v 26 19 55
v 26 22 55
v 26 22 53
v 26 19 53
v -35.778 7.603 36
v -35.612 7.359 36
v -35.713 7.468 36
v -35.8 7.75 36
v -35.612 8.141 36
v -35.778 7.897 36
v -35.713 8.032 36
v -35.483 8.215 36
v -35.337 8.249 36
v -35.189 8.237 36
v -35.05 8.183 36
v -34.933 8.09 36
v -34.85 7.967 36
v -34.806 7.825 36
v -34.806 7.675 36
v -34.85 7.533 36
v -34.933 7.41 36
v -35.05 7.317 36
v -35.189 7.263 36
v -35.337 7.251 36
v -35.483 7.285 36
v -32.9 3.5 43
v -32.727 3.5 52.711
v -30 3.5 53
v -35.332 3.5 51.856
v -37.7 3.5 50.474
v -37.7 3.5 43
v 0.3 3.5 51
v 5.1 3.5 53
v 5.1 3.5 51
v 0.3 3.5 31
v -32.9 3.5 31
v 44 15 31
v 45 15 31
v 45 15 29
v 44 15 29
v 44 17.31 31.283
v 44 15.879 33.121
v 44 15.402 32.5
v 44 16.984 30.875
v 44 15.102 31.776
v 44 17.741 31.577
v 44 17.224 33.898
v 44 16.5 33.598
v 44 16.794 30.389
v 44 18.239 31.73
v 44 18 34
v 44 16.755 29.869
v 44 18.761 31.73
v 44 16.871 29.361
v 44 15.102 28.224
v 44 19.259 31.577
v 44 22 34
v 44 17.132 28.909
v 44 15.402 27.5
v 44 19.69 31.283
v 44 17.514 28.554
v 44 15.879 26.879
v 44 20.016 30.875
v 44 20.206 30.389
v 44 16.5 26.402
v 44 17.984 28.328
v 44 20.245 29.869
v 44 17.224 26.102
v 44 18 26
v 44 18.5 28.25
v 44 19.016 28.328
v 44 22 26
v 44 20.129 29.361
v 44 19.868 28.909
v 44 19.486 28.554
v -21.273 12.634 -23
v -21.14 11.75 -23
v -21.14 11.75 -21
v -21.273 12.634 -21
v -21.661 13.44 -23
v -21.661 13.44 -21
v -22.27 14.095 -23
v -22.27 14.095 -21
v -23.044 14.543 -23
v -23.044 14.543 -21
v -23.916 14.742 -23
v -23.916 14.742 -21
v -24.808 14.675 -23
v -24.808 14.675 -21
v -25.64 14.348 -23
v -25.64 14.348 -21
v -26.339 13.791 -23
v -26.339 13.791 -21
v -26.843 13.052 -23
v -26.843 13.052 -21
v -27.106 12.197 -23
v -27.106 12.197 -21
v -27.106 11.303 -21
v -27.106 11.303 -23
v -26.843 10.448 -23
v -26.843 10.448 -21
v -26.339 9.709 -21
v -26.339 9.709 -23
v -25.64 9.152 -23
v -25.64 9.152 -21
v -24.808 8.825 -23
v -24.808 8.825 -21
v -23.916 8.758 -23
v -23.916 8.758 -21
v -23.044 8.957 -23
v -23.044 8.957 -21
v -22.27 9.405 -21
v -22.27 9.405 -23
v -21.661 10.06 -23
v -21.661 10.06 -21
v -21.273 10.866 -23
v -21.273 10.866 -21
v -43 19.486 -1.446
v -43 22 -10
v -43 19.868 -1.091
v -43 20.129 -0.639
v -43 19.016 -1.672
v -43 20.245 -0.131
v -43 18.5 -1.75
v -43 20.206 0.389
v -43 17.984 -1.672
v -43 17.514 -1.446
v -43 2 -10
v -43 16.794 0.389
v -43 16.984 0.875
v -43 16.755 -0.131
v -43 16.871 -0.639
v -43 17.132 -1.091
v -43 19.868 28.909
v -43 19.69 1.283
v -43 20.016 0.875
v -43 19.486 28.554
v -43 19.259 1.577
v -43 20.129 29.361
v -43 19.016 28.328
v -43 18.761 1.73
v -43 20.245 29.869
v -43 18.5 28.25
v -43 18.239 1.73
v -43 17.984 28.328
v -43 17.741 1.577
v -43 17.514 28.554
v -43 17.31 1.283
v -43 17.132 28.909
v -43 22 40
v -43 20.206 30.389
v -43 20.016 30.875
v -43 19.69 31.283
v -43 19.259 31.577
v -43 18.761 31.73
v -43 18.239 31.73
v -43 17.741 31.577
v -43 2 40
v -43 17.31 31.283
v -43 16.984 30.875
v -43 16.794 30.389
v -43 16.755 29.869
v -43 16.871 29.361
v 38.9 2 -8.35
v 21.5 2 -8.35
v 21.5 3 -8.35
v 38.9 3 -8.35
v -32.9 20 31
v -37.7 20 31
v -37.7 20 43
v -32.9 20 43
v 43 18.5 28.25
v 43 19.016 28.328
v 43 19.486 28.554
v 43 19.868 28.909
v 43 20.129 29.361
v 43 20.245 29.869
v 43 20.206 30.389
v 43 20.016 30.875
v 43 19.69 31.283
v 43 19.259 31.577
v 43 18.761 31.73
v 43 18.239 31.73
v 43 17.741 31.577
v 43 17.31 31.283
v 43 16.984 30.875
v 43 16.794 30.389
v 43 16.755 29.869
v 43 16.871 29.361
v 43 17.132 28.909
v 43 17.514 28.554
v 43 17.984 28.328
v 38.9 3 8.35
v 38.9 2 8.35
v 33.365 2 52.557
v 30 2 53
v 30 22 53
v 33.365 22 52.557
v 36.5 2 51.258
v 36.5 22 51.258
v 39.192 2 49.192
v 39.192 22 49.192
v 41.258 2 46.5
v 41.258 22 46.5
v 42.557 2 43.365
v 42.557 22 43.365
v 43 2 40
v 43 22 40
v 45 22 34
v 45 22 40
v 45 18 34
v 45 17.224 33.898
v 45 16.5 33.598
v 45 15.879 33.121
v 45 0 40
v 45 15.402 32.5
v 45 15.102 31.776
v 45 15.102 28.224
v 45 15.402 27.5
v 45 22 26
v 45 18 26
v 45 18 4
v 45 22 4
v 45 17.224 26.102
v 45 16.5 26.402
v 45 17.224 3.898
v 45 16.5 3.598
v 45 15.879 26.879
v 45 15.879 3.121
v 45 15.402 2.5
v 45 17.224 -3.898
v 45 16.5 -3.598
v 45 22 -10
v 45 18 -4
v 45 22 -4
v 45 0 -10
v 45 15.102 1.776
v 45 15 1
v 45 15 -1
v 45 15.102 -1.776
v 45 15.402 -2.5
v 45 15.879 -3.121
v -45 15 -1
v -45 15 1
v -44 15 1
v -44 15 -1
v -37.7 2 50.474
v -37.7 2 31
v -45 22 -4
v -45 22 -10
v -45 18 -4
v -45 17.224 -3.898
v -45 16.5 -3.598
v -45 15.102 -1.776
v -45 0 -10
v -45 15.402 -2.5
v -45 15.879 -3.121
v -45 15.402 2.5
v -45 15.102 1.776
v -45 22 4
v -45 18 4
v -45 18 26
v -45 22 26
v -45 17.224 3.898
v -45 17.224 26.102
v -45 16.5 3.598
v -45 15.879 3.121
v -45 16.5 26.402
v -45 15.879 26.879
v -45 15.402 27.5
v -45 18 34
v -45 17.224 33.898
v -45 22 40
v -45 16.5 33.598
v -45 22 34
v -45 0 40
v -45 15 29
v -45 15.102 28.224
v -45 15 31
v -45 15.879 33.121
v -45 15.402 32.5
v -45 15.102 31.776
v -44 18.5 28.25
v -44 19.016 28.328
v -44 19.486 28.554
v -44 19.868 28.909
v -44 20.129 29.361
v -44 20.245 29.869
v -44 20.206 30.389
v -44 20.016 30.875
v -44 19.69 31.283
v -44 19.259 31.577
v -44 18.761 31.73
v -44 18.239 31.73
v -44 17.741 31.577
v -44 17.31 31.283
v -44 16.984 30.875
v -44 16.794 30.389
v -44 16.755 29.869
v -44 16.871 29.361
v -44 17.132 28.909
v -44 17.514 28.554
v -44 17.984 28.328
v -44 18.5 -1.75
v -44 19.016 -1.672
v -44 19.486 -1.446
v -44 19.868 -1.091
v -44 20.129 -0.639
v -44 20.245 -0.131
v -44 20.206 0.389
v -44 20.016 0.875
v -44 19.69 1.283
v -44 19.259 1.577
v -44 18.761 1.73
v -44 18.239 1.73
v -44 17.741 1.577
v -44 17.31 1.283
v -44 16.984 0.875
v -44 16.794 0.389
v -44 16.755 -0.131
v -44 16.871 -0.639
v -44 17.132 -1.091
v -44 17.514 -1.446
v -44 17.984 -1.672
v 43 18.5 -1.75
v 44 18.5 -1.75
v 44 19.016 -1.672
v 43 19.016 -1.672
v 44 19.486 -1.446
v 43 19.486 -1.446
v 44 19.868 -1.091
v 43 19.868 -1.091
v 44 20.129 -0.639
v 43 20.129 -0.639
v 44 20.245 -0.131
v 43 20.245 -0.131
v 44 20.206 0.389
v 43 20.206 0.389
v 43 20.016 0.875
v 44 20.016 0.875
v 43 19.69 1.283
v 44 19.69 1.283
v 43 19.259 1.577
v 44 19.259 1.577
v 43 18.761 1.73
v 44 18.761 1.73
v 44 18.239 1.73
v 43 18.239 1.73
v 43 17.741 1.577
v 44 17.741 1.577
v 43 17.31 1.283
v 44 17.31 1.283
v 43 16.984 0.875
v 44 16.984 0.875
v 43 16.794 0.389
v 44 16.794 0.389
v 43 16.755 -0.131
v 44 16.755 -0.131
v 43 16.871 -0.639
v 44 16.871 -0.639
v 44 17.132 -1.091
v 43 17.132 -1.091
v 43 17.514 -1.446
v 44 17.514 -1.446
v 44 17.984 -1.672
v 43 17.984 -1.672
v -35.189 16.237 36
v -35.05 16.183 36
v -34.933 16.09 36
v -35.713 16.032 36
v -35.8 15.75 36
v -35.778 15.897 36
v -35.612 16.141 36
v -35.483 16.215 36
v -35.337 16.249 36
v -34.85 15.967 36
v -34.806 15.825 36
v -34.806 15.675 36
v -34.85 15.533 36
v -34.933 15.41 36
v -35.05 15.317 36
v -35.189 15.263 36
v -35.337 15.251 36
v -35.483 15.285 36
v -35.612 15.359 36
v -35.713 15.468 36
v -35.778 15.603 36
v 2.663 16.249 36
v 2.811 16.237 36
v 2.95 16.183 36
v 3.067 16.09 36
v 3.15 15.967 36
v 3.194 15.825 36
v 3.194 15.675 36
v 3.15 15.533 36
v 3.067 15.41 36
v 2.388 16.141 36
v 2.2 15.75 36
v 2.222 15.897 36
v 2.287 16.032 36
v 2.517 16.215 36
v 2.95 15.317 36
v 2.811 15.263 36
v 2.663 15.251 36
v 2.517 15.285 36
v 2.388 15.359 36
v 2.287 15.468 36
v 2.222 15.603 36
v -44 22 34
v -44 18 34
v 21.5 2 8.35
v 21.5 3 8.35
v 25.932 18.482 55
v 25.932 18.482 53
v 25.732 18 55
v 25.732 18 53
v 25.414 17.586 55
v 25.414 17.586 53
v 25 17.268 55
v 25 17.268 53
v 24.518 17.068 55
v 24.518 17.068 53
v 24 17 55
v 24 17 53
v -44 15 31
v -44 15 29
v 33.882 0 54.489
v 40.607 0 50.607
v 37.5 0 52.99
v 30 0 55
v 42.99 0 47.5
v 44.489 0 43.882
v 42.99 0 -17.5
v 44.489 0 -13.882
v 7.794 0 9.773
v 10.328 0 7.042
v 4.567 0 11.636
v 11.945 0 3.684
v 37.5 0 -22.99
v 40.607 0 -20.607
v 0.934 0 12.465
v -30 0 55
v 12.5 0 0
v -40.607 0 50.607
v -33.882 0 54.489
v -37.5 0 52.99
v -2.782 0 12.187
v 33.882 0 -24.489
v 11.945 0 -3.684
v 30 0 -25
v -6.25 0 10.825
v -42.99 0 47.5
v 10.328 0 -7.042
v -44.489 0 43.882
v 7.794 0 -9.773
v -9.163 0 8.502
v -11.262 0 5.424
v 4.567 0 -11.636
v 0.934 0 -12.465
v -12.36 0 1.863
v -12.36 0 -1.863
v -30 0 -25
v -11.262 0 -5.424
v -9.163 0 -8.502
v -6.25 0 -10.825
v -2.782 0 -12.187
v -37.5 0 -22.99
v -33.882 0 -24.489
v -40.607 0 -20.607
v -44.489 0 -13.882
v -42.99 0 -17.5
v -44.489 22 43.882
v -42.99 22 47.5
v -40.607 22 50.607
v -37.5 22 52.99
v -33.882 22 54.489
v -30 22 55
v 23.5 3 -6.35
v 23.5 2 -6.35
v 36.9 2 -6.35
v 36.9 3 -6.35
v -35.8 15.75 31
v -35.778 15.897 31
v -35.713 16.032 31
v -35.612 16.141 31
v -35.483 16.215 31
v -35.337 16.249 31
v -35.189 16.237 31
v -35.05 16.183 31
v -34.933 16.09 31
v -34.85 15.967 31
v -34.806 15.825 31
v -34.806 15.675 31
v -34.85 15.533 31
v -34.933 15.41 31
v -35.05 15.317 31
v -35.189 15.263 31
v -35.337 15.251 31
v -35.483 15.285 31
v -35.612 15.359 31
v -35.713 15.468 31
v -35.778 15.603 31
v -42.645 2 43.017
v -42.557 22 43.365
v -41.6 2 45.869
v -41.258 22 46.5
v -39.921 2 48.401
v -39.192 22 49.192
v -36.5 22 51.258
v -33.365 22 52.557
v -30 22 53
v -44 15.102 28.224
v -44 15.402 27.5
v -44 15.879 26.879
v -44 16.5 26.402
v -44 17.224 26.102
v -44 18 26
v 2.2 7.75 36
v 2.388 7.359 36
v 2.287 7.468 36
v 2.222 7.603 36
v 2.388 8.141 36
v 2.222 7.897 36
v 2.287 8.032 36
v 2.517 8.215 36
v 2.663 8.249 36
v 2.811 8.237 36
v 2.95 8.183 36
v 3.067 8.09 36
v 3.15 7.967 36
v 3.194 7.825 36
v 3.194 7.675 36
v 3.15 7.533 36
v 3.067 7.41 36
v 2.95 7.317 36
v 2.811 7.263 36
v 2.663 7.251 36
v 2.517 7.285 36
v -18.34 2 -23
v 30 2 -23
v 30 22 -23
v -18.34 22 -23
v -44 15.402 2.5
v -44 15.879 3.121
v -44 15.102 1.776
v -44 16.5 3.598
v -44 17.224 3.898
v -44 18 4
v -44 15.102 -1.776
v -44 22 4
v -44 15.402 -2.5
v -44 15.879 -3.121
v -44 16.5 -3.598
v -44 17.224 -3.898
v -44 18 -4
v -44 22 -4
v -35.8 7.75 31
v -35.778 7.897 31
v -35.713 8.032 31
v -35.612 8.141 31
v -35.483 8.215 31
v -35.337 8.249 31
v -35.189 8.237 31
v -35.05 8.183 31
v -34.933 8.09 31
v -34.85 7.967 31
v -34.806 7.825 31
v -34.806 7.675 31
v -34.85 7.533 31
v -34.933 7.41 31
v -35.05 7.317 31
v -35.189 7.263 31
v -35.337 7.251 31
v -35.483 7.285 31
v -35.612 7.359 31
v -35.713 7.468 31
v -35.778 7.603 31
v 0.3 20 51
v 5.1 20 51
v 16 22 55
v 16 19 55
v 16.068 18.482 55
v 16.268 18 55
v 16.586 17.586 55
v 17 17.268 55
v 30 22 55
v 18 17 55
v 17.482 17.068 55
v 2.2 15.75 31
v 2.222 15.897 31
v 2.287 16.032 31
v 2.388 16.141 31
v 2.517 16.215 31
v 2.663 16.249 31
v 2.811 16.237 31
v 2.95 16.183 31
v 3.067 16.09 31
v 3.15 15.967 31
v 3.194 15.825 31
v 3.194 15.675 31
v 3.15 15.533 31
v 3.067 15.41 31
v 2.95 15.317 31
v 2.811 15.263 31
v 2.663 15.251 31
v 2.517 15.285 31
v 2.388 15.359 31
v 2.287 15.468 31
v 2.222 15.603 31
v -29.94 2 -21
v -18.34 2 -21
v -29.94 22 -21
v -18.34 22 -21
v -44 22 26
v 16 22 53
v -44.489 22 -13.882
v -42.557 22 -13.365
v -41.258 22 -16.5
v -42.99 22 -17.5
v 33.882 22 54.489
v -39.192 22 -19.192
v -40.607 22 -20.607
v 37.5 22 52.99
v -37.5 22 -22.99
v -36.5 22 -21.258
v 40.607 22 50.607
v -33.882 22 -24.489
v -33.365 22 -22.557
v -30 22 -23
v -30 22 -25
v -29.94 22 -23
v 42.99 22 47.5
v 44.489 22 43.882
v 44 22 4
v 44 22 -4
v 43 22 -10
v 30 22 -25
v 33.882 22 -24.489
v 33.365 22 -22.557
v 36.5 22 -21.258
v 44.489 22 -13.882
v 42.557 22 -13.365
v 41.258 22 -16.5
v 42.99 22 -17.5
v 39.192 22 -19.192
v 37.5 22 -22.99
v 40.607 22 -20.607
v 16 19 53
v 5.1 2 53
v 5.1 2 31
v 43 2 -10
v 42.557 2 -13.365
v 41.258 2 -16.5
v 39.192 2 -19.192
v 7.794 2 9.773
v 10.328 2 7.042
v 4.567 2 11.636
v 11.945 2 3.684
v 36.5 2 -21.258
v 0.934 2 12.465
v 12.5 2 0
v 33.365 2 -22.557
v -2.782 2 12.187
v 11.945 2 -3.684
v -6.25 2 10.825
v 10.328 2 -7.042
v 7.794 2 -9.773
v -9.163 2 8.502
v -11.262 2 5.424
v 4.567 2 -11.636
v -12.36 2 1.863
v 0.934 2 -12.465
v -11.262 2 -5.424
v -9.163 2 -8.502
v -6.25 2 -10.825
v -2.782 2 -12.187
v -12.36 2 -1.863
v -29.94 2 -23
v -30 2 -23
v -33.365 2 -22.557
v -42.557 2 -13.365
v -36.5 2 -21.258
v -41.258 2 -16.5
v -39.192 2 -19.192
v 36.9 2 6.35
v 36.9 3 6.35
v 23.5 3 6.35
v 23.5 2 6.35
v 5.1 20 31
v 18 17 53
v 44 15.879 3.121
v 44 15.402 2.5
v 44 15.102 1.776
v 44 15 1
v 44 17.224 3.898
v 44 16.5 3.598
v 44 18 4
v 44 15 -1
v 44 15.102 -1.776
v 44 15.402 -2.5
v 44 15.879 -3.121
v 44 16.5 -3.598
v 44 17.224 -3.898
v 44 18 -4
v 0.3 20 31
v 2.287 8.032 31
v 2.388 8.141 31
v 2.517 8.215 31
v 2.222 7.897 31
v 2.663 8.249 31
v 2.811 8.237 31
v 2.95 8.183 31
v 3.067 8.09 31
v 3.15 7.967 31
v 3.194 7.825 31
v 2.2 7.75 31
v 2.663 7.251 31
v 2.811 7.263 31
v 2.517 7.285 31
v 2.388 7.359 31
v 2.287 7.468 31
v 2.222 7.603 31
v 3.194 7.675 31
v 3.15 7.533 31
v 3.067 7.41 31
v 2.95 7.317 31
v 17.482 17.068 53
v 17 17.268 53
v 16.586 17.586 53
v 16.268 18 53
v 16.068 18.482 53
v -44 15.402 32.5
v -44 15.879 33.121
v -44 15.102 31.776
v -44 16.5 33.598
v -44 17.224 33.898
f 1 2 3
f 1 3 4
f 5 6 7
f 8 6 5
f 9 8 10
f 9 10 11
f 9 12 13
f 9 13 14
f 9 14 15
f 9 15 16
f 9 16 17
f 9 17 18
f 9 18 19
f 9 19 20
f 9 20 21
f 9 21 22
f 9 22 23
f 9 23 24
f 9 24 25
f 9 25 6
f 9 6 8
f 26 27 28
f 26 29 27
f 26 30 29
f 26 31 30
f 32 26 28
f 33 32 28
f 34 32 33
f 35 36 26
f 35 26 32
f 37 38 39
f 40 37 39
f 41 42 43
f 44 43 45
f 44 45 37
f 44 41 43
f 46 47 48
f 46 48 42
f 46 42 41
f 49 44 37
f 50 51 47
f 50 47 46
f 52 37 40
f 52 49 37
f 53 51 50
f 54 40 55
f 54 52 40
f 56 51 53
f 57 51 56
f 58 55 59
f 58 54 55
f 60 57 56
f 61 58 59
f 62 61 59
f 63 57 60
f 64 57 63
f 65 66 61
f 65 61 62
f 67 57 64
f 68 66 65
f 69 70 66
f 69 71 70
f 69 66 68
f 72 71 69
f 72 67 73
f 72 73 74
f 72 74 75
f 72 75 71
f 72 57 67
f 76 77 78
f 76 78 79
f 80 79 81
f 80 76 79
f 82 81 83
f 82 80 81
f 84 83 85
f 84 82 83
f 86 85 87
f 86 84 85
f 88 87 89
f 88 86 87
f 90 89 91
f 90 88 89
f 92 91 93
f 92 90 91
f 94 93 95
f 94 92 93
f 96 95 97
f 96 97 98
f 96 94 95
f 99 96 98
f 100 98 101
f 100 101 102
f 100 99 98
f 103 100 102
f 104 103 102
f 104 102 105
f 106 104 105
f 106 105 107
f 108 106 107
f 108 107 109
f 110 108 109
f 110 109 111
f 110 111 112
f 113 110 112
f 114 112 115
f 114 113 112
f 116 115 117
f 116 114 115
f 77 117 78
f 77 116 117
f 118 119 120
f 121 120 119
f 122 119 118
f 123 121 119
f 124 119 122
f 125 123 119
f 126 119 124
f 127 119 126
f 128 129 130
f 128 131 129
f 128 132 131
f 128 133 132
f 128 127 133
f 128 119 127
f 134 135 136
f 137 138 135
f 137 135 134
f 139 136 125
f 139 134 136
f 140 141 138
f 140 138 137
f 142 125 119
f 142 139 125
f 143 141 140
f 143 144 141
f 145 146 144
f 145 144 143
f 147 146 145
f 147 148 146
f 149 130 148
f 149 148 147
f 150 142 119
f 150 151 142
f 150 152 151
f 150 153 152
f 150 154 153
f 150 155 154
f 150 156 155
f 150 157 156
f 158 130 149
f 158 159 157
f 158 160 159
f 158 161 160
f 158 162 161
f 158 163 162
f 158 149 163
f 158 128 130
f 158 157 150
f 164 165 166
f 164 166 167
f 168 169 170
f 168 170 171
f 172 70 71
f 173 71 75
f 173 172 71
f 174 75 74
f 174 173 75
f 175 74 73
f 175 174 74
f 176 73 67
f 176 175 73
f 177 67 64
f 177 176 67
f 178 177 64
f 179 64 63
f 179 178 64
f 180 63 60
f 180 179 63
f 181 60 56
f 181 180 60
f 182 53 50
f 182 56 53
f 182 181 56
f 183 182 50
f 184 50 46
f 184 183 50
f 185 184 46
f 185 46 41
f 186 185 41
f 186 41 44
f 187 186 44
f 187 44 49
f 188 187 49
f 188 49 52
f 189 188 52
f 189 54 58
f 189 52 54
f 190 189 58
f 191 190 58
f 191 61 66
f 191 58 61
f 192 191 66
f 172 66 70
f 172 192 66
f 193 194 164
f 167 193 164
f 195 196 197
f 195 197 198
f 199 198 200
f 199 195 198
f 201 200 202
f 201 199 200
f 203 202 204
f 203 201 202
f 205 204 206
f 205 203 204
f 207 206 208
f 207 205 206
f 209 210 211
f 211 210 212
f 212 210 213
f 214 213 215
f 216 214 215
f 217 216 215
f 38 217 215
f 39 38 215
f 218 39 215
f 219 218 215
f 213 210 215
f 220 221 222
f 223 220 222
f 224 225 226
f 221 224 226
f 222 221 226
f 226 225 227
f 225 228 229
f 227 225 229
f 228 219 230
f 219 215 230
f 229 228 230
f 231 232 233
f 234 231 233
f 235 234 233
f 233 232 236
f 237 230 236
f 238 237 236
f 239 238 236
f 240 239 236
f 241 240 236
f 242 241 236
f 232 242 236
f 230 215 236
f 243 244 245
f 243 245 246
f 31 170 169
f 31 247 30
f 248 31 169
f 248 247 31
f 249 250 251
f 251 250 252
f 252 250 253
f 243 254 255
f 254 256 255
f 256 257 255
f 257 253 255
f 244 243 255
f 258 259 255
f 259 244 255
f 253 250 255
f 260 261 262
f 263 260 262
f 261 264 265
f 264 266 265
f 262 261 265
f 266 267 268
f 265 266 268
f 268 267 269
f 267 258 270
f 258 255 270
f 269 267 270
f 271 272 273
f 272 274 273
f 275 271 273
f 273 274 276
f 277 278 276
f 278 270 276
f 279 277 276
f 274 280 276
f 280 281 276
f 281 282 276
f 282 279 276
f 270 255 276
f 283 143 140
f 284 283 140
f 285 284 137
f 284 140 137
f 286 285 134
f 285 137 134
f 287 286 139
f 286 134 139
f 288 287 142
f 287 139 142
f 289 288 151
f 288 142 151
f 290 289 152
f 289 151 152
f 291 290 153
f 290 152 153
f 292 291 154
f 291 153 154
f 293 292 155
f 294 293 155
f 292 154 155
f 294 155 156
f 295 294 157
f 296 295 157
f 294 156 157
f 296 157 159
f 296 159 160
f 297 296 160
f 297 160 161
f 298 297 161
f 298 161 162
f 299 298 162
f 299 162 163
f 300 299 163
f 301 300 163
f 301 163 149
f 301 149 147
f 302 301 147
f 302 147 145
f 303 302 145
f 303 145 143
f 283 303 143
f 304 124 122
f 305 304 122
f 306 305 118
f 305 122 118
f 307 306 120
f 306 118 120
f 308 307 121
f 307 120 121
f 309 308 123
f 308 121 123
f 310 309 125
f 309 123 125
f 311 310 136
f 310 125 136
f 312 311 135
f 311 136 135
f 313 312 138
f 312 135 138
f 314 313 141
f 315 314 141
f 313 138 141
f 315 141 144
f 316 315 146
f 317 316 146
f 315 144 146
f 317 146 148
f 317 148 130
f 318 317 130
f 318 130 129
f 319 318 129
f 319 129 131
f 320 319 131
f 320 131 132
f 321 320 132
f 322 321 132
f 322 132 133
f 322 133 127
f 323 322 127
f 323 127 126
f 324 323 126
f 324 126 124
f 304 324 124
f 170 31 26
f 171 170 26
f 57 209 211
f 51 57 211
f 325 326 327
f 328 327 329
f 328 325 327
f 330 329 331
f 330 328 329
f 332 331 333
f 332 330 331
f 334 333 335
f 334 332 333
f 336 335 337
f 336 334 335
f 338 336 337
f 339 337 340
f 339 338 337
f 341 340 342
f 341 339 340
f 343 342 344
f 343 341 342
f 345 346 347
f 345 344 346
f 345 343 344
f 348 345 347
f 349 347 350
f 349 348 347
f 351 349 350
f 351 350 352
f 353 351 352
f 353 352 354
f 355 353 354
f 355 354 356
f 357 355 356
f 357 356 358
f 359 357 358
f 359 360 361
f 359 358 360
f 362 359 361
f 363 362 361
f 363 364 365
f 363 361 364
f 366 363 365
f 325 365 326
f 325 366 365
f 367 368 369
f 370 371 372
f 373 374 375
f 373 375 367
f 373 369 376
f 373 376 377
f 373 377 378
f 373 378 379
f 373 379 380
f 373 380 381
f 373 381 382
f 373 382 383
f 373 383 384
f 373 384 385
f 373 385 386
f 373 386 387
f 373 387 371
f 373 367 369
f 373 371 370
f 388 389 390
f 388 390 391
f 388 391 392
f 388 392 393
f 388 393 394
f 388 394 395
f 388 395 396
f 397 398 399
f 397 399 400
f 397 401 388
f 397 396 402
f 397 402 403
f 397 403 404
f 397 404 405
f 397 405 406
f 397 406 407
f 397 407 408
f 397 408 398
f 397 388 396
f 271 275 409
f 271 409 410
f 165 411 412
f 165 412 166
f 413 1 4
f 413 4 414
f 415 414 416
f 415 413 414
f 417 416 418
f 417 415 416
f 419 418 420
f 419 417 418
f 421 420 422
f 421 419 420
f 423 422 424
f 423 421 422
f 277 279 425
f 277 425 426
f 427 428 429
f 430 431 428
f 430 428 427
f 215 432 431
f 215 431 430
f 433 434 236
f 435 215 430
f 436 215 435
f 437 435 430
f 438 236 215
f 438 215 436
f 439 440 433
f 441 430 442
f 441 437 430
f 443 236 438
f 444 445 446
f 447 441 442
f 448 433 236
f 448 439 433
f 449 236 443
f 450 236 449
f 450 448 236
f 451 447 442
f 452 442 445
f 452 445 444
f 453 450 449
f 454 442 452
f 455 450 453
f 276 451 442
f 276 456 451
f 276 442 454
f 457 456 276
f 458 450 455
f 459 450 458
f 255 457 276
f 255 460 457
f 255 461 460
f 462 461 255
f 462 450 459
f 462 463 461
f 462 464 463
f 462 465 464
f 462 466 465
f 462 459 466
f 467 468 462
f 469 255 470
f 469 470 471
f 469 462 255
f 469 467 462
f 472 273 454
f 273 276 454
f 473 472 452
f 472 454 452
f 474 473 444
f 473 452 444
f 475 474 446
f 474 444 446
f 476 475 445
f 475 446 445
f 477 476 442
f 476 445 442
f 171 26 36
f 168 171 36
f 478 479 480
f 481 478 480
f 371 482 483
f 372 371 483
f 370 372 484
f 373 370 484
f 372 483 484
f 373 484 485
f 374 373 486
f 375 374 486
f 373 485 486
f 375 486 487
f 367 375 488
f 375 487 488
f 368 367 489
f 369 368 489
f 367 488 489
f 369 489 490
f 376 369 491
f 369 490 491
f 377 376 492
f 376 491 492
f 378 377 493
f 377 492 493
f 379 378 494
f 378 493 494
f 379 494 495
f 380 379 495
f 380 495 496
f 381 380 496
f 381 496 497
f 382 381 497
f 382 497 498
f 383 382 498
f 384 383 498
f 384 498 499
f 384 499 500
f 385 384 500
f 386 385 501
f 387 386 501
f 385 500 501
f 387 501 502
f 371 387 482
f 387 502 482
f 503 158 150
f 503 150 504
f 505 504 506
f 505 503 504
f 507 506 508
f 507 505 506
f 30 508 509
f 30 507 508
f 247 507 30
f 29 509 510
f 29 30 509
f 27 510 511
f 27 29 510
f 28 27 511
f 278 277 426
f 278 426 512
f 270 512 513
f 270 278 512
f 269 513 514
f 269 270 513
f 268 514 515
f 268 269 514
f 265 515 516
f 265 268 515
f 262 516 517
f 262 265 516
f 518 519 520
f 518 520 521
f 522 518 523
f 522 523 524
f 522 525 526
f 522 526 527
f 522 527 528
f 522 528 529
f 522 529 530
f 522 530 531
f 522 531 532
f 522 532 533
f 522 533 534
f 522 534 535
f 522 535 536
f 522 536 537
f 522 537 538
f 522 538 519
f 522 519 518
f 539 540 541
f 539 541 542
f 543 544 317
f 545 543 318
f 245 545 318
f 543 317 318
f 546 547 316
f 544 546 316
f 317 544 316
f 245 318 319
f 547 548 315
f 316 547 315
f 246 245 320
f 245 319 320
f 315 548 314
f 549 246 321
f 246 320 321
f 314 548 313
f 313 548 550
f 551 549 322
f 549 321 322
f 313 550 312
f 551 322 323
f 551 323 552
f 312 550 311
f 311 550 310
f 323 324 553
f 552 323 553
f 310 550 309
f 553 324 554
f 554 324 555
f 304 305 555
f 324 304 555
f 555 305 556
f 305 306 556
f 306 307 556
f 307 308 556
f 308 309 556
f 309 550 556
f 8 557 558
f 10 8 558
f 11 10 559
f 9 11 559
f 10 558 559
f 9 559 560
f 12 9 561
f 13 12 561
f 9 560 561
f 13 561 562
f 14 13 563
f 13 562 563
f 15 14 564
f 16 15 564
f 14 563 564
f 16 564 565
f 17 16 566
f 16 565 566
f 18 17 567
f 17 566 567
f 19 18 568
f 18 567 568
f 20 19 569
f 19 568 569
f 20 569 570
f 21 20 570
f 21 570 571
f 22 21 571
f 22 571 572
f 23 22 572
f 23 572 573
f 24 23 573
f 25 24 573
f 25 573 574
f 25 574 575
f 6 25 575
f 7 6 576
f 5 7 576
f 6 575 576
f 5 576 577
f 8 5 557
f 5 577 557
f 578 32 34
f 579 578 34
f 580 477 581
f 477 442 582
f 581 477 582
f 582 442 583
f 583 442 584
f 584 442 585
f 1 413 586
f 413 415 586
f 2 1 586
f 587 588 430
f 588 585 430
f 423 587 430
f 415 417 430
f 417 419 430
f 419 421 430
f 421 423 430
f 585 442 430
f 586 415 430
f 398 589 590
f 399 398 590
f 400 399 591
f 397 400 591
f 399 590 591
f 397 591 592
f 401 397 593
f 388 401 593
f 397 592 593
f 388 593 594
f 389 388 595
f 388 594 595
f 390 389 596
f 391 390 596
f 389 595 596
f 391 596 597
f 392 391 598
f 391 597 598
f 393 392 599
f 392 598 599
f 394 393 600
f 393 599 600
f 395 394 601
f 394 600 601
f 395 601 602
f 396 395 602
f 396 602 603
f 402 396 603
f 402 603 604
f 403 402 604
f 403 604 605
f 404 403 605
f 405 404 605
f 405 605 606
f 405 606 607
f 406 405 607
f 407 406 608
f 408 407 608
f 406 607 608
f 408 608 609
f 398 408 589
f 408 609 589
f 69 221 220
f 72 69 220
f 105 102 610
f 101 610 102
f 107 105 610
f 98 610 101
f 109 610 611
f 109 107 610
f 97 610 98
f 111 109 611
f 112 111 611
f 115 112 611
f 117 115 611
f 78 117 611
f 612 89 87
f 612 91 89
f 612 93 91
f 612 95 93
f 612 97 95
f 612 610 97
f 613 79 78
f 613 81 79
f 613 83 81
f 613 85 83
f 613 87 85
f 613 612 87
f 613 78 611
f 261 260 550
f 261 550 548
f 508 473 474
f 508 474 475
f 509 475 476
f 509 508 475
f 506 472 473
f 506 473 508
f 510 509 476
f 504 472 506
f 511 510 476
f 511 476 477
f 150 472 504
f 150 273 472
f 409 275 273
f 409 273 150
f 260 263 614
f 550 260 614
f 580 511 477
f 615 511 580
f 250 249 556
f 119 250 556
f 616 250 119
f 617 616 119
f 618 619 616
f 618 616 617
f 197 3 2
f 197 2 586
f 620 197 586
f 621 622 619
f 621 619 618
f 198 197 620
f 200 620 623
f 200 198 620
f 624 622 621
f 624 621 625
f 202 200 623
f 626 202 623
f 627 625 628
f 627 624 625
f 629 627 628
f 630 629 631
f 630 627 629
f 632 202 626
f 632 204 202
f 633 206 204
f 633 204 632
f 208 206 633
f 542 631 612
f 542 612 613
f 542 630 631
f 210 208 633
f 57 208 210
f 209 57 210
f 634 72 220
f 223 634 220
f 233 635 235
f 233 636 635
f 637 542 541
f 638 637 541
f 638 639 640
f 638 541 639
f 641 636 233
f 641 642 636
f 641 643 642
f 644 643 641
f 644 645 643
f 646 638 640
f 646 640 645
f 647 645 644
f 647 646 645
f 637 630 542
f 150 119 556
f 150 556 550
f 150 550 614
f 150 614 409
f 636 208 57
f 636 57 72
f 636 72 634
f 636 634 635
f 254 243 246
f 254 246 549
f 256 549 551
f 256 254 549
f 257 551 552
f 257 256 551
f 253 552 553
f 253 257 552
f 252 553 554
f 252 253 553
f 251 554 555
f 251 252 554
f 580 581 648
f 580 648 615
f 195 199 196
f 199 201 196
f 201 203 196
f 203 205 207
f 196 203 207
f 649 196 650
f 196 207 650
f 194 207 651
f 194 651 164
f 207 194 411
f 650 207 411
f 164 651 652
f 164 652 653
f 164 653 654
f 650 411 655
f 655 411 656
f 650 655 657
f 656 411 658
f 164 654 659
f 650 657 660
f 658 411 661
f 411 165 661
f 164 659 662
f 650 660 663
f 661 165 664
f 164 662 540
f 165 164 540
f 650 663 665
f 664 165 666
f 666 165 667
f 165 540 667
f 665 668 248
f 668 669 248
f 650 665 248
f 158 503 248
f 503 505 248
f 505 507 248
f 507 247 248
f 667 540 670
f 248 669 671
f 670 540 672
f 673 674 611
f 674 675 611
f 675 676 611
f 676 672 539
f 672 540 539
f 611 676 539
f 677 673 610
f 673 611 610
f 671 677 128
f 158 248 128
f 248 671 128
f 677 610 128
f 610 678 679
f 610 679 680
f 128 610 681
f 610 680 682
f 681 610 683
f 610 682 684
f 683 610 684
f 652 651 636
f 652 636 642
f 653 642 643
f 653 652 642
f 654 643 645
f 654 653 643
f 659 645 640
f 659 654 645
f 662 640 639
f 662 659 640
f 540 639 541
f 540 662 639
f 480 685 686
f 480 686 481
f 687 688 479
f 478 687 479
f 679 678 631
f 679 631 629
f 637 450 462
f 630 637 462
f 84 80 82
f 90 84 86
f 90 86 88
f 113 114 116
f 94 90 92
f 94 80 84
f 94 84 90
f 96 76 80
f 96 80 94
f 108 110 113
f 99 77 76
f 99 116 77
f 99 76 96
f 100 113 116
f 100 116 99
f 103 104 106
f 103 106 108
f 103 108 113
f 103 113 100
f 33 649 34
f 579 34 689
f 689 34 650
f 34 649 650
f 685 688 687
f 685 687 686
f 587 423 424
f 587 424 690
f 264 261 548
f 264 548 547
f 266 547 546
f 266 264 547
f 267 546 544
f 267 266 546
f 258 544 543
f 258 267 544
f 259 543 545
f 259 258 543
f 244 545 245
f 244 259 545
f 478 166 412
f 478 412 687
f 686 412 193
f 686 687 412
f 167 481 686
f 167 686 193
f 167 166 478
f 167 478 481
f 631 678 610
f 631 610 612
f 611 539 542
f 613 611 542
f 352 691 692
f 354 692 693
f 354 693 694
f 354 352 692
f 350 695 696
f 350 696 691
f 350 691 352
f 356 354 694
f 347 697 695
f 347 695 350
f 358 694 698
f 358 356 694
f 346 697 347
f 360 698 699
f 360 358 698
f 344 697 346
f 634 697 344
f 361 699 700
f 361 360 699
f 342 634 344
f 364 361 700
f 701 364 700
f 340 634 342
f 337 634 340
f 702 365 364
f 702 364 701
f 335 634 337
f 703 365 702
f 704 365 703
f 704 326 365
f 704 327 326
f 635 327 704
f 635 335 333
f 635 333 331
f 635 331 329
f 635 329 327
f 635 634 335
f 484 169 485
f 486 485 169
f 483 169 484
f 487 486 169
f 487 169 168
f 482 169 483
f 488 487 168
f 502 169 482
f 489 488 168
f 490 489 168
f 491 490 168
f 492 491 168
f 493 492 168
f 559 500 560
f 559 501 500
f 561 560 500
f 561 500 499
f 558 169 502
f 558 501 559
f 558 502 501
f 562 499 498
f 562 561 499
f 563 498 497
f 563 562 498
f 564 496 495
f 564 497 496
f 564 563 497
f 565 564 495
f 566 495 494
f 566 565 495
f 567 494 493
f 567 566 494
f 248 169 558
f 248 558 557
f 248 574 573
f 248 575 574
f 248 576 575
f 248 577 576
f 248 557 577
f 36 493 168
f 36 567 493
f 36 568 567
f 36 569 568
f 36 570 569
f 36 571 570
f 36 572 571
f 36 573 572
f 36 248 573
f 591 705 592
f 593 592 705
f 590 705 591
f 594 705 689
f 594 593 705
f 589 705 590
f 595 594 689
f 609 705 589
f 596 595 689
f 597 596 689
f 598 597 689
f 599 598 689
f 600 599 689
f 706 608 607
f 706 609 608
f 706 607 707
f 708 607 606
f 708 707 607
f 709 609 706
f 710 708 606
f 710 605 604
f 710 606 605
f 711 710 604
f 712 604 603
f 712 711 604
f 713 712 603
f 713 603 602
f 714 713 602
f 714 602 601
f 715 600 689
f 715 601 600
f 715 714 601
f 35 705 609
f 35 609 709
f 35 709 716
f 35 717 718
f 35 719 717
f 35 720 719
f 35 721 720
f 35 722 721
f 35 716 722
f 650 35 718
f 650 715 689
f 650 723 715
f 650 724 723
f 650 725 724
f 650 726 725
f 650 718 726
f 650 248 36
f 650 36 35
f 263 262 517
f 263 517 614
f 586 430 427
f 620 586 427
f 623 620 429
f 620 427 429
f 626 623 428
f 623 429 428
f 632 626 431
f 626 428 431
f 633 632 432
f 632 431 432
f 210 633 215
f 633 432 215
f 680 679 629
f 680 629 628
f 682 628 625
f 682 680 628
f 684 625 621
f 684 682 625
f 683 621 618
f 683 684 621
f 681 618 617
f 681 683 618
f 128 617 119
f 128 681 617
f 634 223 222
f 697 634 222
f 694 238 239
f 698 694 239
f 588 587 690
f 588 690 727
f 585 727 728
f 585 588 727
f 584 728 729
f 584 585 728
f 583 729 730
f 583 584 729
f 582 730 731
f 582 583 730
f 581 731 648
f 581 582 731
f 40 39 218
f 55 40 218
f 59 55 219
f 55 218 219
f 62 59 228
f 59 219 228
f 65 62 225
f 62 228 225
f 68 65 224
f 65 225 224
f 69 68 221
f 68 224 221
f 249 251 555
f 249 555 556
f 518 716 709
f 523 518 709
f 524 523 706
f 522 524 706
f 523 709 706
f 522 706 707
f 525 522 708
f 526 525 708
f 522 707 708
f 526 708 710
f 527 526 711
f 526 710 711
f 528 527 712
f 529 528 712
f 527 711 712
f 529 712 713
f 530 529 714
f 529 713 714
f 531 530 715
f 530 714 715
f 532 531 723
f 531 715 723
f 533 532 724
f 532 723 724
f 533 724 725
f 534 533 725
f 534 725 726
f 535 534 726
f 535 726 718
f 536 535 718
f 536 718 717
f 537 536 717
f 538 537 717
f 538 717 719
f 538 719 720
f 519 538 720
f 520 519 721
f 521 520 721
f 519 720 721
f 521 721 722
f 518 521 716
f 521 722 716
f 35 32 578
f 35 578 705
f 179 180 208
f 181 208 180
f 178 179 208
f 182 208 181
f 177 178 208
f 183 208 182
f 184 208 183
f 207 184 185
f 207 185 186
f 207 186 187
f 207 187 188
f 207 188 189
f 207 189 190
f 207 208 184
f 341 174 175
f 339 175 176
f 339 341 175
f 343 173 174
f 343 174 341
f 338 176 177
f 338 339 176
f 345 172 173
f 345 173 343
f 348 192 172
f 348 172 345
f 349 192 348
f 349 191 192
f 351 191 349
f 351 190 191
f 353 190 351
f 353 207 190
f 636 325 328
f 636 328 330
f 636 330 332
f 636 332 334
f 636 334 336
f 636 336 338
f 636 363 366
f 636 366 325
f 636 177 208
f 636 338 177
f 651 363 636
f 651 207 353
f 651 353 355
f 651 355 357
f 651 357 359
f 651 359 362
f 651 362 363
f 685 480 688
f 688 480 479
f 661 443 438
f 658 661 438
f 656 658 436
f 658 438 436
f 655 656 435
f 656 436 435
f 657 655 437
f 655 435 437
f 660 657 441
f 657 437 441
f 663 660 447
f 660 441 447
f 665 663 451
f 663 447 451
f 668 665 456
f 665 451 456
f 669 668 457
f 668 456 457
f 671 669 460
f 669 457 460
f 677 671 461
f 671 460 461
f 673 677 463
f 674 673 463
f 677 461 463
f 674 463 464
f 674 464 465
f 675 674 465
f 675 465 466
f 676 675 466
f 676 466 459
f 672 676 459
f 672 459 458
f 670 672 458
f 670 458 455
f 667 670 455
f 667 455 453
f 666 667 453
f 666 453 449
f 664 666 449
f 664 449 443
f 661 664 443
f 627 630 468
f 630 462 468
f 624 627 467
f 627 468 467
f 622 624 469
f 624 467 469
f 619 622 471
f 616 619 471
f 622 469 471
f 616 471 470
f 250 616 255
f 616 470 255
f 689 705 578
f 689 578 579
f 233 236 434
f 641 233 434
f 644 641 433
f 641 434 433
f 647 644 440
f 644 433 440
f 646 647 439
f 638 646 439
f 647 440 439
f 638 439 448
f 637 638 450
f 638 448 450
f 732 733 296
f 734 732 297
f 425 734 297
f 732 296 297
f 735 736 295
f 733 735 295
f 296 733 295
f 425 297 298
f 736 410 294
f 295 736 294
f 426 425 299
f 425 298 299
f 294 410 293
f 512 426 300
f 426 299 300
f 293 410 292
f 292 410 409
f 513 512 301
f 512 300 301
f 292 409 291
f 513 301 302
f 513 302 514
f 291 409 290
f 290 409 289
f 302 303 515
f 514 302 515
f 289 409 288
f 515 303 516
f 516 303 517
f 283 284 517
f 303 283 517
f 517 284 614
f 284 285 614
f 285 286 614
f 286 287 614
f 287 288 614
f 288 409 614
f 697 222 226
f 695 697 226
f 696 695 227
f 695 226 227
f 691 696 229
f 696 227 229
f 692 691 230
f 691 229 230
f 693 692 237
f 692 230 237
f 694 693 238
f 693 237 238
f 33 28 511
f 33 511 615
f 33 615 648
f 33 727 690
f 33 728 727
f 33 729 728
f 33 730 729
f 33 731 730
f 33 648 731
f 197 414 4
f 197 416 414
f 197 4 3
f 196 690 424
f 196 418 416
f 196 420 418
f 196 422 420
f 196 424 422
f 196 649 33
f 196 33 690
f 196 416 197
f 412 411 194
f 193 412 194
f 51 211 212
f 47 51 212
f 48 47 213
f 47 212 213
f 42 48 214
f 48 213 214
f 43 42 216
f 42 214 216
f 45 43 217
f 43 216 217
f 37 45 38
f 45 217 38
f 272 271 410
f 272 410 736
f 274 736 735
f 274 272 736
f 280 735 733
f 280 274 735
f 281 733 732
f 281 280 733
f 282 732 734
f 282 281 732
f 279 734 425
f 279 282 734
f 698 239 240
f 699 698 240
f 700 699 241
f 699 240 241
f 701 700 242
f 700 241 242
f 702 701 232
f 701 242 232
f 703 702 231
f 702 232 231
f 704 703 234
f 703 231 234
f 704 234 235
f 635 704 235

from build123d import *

# Parameters (mm, degrees)
BOSS_EXTRUDE1_DEPTH = 2
BOSS_EXTRUDE2_DEPTH = 20
SKETCH3_R           = 12.5
CUT_EXTRUDE2_DEPTH  = 23
BOSS_EXTRUDE3_DEPTH = 1.5
SKETCH6_W           = 17.4
SKETCH6_H           = 16.7
SKETCH6_W_2         = 13.4
SKETCH6_H_2         = 12.7
BOSS_EXTRUDE4_DEPTH = 1
SKETCH7_W           = 11.6
SKETCH7_H           = 20
SKETCH7_R           = 3
BOSS_EXTRUDE5_DEPTH = 2
SKETCH8_W           = 4.8
SKETCH8_H           = 12
SKETCH8_H_2         = 20
BOSS_EXTRUDE6_DEPTH = 16.5
SKETCH9_R           = 0.5
CUT_EXTRUDE3_DEPTH  = 5
CUT_EXTRUDE4_DEPTH  = 2
SKETCH11_R          = 1.75
CUT_EXTRUDE5_DEPTH  = 2
CUT_EXTRUDE6_DEPTH  = 1


with BuildPart() as part:
    # Sketch1 → Boss-Extrude1 (new body)
    with BuildSketch(Plane(origin=(0, 0, 0), x_dir=(1, 0, 0), z_dir=(0, 1, 0))):
        with BuildLine():
            Line((-30, 25), (30, 25))
            ThreePointArc((30, 25), (40.606601718, 20.606601718), (45, 10))
            Line((45, 10), (45, -40))
            ThreePointArc((45, -40), (40.606601718, -50.606601718), (30, -55))
            Line((30, -55), (-30, -55))
            ThreePointArc((-30, -55), (-40.606601718, -50.606601718), (-45, -40))
            Line((-45, -40), (-45, 10))
            ThreePointArc((-45, 10), (-40.606601718, 20.606601718), (-30, 25))
        make_face()
    extrude(amount=BOSS_EXTRUDE1_DEPTH)

    # Sketch4 → Boss-Extrude2 (add)
    with BuildSketch(Plane(origin=(0, 2, 0), x_dir=(1, 0, 0), z_dir=(0, 1, 0))):
        with BuildLine():
            Line((30, 25), (-30, 25))
            ThreePointArc((-30, 25), (-40.606601718, 20.606601718), (-45, 10))
            Line((-45, 10), (-45, -40))
            ThreePointArc((-45, -40), (-40.606601718, -50.606601718), (-30, -55))
            Line((-30, -55), (30, -55))
            ThreePointArc((30, -55), (40.606601718, -50.606601718), (45, -40))
            Line((45, -40), (45, 10))
            ThreePointArc((45, 10), (40.606601718, 20.606601718), (30, 25))
        make_face()
        with BuildLine():
            Line((30, 23), (-30, 23))
            ThreePointArc((-30, 23), (-39.192388155, 19.192388155), (-43, 10))
            Line((-43, 10), (-43, -40))
            ThreePointArc((-43, -40), (-39.192388155, -49.192388155), (-30, -53))
            Line((-30, -53), (30, -53))
            ThreePointArc((30, -53), (39.192388155, -49.192388155), (43, -40))
            Line((43, -40), (43, 10))
            ThreePointArc((43, 10), (39.192388155, 19.192388155), (30, 23))
        make_face(mode=Mode.SUBTRACT)
    extrude(amount=BOSS_EXTRUDE2_DEPTH)

    # Sketch3 → Cut-Extrude2 (cut, through all)
    with BuildSketch(Plane.XZ):
        Circle(SKETCH3_R)
    extrude(amount=-CUT_EXTRUDE2_DEPTH, mode=Mode.SUBTRACT)

    # Sketch5 → Boss-Extrude3 (add)
    with BuildSketch(Plane(origin=(0, 2, 0), x_dir=(1, 0, 0), z_dir=(0, 1, 0))):
        Polygon((-36.002943725, -53), (5.1, -53), (5.1, -31), (-37.7, -31), (-37.7, -51.302943725), align=None)
    extrude(amount=BOSS_EXTRUDE3_DEPTH)

    # Sketch6 → Boss-Extrude4 (add)
    with BuildSketch(Plane(origin=(0, 2, 0), x_dir=(1, 0, 0), z_dir=(0, 1, 0))):
        with Locations((30.2, 0)):
            Rectangle(SKETCH6_W, SKETCH6_H)
        with Locations((30.2, 0)):
            Rectangle(SKETCH6_W_2, SKETCH6_H_2, mode=Mode.SUBTRACT)
    extrude(amount=BOSS_EXTRUDE4_DEPTH)

    # Sketch7 → Boss-Extrude5 (add)
    with BuildSketch(Plane.XY.offset(-23)):
        with Locations((-24.14, 12)):
            Rectangle(SKETCH7_W, SKETCH7_H)
        with Locations((-24.14, 11.75)):
            Circle(SKETCH7_R, mode=Mode.SUBTRACT)
    extrude(amount=BOSS_EXTRUDE5_DEPTH)

    # Sketch8 → Boss-Extrude6 (add)
    with BuildSketch(Plane(origin=(0, 3.5, 0), x_dir=(1, 0, 0), z_dir=(0, 1, 0))):
        with Locations((-35.3, -37)):
            Rectangle(SKETCH8_W, SKETCH8_H)
        with Locations((2.7, -41)):
            Rectangle(SKETCH8_W, SKETCH8_H_2)
    extrude(amount=BOSS_EXTRUDE6_DEPTH)

    # Sketch9 → Cut-Extrude3 (cut)
    with BuildSketch(Plane(origin=(0, 0, 31), x_dir=(-1, 0, 0), z_dir=(0, 0, -1))):
        with Locations((-2.7, 15.75)):
            Circle(SKETCH9_R)
        with Locations((-2.7, 7.75)):
            Circle(SKETCH9_R)
        with Locations((35.3, 15.75)):
            Circle(SKETCH9_R)
        with Locations((35.3, 7.75)):
            Circle(SKETCH9_R)
    extrude(amount=-CUT_EXTRUDE3_DEPTH, mode=Mode.SUBTRACT)

    # Sketch10 → Cut-Extrude4 (cut)
    with BuildSketch(Plane.XY.offset(55)):
        with BuildLine():
            Line((16, 22), (26, 22))
            Line((26, 22), (26, 19))
            ThreePointArc((26, 19), (25.414213562, 17.585786438), (24, 17))
            Line((24, 17), (18, 17))
            ThreePointArc((18, 17), (16.585786438, 17.585786438), (16, 19))
            Line((16, 19), (16, 22))
        make_face()
    extrude(amount=-CUT_EXTRUDE4_DEPTH, mode=Mode.SUBTRACT)

    # Sketch11 → Cut-Extrude5 (cut)
    with BuildSketch(Plane(origin=(-43, 0, 0), x_dir=(0, 0, -1), z_dir=(1, 0, 0))):
        with Locations((-30, 18.5)):
            Circle(SKETCH11_R)
        with Locations((0, 18.5)):
            Circle(SKETCH11_R)
    cut_extrude5 = extrude(amount=-CUT_EXTRUDE5_DEPTH, mode=Mode.SUBTRACT)

    # Sketch12 → Cut-Extrude6 (cut)
    with BuildSketch(Plane.ZY.offset(45)):
        with BuildLine():
            Line((-4, 22), (4, 22))
            Line((4, 22), (4, 18))
            ThreePointArc((4, 18), (3.121320344, 15.878679656), (1, 15))
            Line((1, 15), (-1, 15))
            ThreePointArc((-1, 15), (-3.121320344, 15.878679656), (-4, 18))
            Line((-4, 18), (-4, 22))
        make_face()
        with BuildLine():
            Line((26, 22), (34, 22))
            Line((34, 22), (34, 18))
            ThreePointArc((34, 18), (33.121320344, 15.878679656), (31, 15))
            Line((31, 15), (29, 15))
            ThreePointArc((29, 15), (26.878679656, 15.878679656), (26, 18))
            Line((26, 18), (26, 22))
        make_face()
    cut_extrude6 = extrude(amount=-CUT_EXTRUDE6_DEPTH, mode=Mode.SUBTRACT)

    # Mirror1: Cut-Extrude5, Cut-Extrude6 across plane
    add(cut_extrude5.mirror(Plane(origin=(0, 0, 0), x_dir=(0, 0, 1), z_dir=(1, 0, 0))), mode=Mode.SUBTRACT)
    add(cut_extrude6.mirror(Plane(origin=(0, 0, 0), x_dir=(0, 0, 1), z_dir=(1, 0, 0))), mode=Mode.SUBTRACT)


solid = part.part
